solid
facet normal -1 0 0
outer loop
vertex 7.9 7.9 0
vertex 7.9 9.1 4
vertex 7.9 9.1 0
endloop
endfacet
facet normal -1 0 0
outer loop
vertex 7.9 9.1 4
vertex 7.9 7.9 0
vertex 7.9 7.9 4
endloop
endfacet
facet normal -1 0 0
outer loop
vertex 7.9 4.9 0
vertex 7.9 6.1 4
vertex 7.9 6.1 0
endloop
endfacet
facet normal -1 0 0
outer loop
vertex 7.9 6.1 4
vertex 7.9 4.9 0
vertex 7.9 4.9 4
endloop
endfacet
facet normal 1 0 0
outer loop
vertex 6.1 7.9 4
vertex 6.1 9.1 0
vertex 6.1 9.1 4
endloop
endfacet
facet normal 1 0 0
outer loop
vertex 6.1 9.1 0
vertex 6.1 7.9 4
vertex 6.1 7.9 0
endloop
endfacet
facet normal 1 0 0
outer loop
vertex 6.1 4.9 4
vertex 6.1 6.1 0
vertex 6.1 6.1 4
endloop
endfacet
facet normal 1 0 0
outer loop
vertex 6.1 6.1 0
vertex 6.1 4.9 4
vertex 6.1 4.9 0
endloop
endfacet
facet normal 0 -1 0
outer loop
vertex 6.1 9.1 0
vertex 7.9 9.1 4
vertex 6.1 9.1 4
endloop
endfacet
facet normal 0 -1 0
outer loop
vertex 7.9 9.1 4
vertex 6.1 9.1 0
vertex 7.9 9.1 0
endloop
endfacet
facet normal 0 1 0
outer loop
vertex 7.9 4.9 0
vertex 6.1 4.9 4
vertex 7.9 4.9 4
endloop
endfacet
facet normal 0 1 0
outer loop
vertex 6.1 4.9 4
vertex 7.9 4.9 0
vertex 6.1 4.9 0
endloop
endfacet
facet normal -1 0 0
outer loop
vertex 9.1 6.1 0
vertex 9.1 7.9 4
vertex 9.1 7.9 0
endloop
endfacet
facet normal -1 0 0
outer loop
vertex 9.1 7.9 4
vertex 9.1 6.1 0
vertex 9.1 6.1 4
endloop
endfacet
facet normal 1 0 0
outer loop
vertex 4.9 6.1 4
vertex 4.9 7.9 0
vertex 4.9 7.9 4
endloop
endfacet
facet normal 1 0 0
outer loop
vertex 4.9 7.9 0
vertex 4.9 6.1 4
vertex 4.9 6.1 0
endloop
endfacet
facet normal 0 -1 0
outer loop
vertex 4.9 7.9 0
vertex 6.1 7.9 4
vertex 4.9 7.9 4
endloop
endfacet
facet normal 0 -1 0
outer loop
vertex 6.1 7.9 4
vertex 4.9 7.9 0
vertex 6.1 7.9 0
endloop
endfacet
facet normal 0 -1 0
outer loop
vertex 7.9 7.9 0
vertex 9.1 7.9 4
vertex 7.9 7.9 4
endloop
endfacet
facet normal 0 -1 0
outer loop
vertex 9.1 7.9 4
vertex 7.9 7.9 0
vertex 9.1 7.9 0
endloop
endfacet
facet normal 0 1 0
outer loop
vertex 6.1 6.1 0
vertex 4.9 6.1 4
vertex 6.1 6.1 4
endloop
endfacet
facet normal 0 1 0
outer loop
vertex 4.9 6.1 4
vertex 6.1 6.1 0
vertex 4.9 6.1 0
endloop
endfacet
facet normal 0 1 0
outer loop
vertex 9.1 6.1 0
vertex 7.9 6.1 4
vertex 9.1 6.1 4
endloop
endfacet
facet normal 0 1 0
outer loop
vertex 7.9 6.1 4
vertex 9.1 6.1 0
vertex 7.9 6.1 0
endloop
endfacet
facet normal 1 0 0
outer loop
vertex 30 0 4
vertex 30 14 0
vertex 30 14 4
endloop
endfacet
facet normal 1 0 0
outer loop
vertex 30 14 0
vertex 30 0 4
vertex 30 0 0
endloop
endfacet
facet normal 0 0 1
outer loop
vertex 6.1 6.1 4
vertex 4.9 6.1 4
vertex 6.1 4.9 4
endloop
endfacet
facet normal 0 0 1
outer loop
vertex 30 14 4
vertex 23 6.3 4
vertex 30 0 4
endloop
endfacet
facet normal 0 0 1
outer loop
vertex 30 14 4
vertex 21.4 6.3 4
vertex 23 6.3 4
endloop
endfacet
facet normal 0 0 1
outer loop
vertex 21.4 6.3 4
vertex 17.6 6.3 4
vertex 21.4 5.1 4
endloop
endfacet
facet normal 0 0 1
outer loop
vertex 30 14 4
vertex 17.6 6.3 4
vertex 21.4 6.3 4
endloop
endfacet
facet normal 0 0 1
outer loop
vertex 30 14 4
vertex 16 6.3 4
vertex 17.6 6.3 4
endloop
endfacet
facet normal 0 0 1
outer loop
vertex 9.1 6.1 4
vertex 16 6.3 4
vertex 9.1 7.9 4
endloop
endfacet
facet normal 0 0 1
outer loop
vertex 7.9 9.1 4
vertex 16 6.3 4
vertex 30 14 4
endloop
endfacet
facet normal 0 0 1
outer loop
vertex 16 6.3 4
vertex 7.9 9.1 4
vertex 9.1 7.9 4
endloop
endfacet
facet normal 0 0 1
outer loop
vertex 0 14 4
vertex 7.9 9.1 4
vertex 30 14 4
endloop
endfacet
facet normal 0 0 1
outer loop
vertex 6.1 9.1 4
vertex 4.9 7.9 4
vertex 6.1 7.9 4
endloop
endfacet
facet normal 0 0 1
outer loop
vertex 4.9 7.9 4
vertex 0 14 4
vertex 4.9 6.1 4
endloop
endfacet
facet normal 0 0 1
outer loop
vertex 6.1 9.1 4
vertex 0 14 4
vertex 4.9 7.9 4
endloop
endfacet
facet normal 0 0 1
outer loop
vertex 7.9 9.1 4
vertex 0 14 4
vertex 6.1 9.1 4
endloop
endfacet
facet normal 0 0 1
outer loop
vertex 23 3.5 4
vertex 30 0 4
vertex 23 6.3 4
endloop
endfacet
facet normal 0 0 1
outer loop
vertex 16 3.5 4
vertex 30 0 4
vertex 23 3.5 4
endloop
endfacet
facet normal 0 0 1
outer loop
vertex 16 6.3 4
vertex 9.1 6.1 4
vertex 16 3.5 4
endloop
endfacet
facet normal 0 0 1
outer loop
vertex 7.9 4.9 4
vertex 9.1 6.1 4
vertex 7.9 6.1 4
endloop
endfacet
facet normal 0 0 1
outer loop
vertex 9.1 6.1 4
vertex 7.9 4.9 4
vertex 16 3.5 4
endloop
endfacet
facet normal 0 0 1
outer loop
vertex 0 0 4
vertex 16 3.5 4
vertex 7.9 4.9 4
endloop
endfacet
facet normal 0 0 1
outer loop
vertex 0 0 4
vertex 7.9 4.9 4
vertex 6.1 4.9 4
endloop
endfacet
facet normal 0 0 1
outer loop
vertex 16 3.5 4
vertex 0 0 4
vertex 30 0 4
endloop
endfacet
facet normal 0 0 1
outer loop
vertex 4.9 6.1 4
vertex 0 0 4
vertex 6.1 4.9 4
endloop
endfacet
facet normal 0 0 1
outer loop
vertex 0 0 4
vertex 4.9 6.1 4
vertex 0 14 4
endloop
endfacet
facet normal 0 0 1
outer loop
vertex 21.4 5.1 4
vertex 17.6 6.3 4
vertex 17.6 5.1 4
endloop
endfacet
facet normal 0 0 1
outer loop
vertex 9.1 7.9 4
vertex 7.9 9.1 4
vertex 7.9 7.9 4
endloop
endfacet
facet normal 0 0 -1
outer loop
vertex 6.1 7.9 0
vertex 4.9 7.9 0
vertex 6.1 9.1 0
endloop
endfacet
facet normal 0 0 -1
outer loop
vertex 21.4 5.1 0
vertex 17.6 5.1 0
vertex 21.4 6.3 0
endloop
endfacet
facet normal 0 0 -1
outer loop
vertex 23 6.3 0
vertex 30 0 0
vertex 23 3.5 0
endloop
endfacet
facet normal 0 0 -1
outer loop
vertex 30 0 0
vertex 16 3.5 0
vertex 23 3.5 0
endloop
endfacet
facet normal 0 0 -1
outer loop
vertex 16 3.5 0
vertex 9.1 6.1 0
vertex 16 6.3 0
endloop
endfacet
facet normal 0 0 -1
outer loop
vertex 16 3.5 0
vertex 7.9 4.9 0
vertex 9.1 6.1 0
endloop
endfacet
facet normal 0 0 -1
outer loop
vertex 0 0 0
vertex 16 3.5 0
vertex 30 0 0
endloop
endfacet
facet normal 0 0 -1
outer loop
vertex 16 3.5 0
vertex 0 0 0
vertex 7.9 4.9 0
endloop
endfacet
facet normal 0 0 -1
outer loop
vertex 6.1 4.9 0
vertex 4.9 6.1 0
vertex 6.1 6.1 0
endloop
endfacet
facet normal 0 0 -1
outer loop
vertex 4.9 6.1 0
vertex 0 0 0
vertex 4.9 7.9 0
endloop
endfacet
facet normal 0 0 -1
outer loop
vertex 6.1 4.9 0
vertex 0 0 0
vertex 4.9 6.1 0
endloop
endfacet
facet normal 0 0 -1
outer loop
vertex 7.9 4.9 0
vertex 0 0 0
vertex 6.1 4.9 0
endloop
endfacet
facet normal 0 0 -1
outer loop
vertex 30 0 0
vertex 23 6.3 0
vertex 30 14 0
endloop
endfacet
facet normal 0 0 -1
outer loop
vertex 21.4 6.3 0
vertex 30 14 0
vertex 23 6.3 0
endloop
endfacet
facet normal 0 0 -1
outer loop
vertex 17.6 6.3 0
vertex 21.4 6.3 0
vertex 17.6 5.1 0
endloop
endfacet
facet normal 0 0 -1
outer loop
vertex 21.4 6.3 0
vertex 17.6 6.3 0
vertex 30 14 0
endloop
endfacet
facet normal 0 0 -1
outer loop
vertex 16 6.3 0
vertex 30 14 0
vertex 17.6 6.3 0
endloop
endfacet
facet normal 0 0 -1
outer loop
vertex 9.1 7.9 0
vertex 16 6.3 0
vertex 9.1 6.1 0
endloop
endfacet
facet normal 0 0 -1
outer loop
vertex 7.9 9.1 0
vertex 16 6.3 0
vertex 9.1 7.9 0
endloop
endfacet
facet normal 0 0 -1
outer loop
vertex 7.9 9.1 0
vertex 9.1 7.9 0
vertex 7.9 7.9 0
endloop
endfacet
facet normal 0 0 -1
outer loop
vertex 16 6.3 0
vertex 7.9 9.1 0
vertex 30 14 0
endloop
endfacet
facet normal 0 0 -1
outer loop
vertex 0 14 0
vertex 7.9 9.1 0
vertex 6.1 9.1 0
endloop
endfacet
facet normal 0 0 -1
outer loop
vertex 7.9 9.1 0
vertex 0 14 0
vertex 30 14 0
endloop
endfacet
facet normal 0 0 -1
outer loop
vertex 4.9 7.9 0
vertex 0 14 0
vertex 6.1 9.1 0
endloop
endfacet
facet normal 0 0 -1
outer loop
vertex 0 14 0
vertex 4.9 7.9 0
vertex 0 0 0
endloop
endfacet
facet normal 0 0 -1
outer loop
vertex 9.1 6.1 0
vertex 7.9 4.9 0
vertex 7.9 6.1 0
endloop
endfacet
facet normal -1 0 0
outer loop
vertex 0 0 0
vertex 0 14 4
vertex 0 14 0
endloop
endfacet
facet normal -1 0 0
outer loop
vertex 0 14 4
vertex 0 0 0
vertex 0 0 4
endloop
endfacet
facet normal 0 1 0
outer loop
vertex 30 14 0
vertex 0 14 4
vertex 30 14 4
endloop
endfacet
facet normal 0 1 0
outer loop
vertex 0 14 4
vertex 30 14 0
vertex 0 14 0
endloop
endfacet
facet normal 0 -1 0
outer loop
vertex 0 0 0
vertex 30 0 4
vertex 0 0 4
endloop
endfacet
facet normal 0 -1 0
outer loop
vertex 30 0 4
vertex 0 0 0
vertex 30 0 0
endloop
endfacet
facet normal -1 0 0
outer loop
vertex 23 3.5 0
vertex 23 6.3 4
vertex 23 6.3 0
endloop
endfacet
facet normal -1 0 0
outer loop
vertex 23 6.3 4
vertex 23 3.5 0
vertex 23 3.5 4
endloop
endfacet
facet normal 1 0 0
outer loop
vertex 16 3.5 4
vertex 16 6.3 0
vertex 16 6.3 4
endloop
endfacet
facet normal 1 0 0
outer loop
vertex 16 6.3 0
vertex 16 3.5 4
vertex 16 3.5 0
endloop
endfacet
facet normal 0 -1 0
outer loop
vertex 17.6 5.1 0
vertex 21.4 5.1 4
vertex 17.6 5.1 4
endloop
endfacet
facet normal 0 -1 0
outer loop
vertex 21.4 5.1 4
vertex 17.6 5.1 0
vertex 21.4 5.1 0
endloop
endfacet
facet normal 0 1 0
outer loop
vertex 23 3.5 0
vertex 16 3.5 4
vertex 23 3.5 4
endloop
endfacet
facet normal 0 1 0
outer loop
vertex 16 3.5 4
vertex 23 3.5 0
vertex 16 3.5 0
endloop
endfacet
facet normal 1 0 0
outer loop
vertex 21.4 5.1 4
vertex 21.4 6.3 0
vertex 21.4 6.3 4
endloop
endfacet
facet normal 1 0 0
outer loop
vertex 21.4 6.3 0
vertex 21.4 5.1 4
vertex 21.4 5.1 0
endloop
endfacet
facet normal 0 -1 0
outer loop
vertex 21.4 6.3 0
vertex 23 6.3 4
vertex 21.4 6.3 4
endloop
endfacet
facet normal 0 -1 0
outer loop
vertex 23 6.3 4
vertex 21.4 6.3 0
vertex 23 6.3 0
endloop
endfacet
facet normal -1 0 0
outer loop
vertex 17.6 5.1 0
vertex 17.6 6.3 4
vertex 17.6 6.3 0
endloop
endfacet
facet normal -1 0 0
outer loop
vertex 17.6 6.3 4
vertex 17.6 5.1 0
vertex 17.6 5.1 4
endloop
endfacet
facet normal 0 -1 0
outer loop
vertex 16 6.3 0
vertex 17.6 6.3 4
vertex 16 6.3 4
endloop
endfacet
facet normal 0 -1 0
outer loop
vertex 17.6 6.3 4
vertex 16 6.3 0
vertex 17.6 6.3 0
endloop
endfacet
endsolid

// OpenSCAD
// Durock v2 stabilizer adapters for vintage Atari XE space bar caps
// (c) Bertrand Le Roy
// Licensed under MIT

$fa = 1;
$fs = 0.2;

// Cap type
cap_type = "Atari XE ■ Space bar"; // [Atari XE ◎ Space bar, Atari XE ■ Space bar]

duroc_thickness = 1.8 + 0;
duroc_size = 4.2 + 0;

if (cap_type == "Atari XE ■ Space bar") {
    adapter_width = 30;
    adapter_depth = 14;
    adapter_height = 4;
    adapter_thickness = 1.6;
    adapter_x_offset = 19.5;

    difference() {
        cube([adapter_width, adapter_depth, adapter_height]);

        translate([7, adapter_depth / 2, adapter_height / 2]) {
            union() {
                cube([duroc_thickness, duroc_size, adapter_height * 1.1], center = true);
                cube([duroc_size, duroc_thickness, adapter_height * 1.1], center = true);
            }
        }
        translate([adapter_x_offset, 3.5 + adapter_thickness / 2, adapter_height / 2])
            cube([7, adapter_thickness, adapter_height * 1.1], center = true);
        translate([adapter_x_offset + (7 - adapter_thickness) / 2, 4.25 + adapter_thickness / 2, adapter_height / 2])
            cube([adapter_thickness, 2.5, adapter_height * 1.1], center = true);
        translate([adapter_x_offset - (7 - adapter_thickness) / 2, 4.25 + adapter_thickness / 2, adapter_height / 2])
            cube([adapter_thickness, 2.5, adapter_height * 1.1], center = true);
    }
}
else {
    adapter_width = 56;
    adapter_depth = 12;
    adapter_height = 6.5;
    adapter_thickness = 1.8;
    adapter_x_offset = adapter_width;

    difference() {
        cube([adapter_width, adapter_depth, adapter_height]);

        translate([31, adapter_depth / 2, adapter_height / 2]) {
            union() {
                cube([duroc_thickness, duroc_size, adapter_height * 1.1], center = true);
                cube([duroc_size, duroc_thickness, adapter_height * 1.1], center = true);
            }
        }
        translate([0, adapter_depth / 2, adapter_height / 2])
            cube([3.5 * 2, 1.5, adapter_height * 1.1], center = true);
        translate([adapter_x_offset, adapter_depth / 2, adapter_height / 2])
            cube([2.5 * 2, adapter_thickness, adapter_height * 1.1], center = true);
    }
}
